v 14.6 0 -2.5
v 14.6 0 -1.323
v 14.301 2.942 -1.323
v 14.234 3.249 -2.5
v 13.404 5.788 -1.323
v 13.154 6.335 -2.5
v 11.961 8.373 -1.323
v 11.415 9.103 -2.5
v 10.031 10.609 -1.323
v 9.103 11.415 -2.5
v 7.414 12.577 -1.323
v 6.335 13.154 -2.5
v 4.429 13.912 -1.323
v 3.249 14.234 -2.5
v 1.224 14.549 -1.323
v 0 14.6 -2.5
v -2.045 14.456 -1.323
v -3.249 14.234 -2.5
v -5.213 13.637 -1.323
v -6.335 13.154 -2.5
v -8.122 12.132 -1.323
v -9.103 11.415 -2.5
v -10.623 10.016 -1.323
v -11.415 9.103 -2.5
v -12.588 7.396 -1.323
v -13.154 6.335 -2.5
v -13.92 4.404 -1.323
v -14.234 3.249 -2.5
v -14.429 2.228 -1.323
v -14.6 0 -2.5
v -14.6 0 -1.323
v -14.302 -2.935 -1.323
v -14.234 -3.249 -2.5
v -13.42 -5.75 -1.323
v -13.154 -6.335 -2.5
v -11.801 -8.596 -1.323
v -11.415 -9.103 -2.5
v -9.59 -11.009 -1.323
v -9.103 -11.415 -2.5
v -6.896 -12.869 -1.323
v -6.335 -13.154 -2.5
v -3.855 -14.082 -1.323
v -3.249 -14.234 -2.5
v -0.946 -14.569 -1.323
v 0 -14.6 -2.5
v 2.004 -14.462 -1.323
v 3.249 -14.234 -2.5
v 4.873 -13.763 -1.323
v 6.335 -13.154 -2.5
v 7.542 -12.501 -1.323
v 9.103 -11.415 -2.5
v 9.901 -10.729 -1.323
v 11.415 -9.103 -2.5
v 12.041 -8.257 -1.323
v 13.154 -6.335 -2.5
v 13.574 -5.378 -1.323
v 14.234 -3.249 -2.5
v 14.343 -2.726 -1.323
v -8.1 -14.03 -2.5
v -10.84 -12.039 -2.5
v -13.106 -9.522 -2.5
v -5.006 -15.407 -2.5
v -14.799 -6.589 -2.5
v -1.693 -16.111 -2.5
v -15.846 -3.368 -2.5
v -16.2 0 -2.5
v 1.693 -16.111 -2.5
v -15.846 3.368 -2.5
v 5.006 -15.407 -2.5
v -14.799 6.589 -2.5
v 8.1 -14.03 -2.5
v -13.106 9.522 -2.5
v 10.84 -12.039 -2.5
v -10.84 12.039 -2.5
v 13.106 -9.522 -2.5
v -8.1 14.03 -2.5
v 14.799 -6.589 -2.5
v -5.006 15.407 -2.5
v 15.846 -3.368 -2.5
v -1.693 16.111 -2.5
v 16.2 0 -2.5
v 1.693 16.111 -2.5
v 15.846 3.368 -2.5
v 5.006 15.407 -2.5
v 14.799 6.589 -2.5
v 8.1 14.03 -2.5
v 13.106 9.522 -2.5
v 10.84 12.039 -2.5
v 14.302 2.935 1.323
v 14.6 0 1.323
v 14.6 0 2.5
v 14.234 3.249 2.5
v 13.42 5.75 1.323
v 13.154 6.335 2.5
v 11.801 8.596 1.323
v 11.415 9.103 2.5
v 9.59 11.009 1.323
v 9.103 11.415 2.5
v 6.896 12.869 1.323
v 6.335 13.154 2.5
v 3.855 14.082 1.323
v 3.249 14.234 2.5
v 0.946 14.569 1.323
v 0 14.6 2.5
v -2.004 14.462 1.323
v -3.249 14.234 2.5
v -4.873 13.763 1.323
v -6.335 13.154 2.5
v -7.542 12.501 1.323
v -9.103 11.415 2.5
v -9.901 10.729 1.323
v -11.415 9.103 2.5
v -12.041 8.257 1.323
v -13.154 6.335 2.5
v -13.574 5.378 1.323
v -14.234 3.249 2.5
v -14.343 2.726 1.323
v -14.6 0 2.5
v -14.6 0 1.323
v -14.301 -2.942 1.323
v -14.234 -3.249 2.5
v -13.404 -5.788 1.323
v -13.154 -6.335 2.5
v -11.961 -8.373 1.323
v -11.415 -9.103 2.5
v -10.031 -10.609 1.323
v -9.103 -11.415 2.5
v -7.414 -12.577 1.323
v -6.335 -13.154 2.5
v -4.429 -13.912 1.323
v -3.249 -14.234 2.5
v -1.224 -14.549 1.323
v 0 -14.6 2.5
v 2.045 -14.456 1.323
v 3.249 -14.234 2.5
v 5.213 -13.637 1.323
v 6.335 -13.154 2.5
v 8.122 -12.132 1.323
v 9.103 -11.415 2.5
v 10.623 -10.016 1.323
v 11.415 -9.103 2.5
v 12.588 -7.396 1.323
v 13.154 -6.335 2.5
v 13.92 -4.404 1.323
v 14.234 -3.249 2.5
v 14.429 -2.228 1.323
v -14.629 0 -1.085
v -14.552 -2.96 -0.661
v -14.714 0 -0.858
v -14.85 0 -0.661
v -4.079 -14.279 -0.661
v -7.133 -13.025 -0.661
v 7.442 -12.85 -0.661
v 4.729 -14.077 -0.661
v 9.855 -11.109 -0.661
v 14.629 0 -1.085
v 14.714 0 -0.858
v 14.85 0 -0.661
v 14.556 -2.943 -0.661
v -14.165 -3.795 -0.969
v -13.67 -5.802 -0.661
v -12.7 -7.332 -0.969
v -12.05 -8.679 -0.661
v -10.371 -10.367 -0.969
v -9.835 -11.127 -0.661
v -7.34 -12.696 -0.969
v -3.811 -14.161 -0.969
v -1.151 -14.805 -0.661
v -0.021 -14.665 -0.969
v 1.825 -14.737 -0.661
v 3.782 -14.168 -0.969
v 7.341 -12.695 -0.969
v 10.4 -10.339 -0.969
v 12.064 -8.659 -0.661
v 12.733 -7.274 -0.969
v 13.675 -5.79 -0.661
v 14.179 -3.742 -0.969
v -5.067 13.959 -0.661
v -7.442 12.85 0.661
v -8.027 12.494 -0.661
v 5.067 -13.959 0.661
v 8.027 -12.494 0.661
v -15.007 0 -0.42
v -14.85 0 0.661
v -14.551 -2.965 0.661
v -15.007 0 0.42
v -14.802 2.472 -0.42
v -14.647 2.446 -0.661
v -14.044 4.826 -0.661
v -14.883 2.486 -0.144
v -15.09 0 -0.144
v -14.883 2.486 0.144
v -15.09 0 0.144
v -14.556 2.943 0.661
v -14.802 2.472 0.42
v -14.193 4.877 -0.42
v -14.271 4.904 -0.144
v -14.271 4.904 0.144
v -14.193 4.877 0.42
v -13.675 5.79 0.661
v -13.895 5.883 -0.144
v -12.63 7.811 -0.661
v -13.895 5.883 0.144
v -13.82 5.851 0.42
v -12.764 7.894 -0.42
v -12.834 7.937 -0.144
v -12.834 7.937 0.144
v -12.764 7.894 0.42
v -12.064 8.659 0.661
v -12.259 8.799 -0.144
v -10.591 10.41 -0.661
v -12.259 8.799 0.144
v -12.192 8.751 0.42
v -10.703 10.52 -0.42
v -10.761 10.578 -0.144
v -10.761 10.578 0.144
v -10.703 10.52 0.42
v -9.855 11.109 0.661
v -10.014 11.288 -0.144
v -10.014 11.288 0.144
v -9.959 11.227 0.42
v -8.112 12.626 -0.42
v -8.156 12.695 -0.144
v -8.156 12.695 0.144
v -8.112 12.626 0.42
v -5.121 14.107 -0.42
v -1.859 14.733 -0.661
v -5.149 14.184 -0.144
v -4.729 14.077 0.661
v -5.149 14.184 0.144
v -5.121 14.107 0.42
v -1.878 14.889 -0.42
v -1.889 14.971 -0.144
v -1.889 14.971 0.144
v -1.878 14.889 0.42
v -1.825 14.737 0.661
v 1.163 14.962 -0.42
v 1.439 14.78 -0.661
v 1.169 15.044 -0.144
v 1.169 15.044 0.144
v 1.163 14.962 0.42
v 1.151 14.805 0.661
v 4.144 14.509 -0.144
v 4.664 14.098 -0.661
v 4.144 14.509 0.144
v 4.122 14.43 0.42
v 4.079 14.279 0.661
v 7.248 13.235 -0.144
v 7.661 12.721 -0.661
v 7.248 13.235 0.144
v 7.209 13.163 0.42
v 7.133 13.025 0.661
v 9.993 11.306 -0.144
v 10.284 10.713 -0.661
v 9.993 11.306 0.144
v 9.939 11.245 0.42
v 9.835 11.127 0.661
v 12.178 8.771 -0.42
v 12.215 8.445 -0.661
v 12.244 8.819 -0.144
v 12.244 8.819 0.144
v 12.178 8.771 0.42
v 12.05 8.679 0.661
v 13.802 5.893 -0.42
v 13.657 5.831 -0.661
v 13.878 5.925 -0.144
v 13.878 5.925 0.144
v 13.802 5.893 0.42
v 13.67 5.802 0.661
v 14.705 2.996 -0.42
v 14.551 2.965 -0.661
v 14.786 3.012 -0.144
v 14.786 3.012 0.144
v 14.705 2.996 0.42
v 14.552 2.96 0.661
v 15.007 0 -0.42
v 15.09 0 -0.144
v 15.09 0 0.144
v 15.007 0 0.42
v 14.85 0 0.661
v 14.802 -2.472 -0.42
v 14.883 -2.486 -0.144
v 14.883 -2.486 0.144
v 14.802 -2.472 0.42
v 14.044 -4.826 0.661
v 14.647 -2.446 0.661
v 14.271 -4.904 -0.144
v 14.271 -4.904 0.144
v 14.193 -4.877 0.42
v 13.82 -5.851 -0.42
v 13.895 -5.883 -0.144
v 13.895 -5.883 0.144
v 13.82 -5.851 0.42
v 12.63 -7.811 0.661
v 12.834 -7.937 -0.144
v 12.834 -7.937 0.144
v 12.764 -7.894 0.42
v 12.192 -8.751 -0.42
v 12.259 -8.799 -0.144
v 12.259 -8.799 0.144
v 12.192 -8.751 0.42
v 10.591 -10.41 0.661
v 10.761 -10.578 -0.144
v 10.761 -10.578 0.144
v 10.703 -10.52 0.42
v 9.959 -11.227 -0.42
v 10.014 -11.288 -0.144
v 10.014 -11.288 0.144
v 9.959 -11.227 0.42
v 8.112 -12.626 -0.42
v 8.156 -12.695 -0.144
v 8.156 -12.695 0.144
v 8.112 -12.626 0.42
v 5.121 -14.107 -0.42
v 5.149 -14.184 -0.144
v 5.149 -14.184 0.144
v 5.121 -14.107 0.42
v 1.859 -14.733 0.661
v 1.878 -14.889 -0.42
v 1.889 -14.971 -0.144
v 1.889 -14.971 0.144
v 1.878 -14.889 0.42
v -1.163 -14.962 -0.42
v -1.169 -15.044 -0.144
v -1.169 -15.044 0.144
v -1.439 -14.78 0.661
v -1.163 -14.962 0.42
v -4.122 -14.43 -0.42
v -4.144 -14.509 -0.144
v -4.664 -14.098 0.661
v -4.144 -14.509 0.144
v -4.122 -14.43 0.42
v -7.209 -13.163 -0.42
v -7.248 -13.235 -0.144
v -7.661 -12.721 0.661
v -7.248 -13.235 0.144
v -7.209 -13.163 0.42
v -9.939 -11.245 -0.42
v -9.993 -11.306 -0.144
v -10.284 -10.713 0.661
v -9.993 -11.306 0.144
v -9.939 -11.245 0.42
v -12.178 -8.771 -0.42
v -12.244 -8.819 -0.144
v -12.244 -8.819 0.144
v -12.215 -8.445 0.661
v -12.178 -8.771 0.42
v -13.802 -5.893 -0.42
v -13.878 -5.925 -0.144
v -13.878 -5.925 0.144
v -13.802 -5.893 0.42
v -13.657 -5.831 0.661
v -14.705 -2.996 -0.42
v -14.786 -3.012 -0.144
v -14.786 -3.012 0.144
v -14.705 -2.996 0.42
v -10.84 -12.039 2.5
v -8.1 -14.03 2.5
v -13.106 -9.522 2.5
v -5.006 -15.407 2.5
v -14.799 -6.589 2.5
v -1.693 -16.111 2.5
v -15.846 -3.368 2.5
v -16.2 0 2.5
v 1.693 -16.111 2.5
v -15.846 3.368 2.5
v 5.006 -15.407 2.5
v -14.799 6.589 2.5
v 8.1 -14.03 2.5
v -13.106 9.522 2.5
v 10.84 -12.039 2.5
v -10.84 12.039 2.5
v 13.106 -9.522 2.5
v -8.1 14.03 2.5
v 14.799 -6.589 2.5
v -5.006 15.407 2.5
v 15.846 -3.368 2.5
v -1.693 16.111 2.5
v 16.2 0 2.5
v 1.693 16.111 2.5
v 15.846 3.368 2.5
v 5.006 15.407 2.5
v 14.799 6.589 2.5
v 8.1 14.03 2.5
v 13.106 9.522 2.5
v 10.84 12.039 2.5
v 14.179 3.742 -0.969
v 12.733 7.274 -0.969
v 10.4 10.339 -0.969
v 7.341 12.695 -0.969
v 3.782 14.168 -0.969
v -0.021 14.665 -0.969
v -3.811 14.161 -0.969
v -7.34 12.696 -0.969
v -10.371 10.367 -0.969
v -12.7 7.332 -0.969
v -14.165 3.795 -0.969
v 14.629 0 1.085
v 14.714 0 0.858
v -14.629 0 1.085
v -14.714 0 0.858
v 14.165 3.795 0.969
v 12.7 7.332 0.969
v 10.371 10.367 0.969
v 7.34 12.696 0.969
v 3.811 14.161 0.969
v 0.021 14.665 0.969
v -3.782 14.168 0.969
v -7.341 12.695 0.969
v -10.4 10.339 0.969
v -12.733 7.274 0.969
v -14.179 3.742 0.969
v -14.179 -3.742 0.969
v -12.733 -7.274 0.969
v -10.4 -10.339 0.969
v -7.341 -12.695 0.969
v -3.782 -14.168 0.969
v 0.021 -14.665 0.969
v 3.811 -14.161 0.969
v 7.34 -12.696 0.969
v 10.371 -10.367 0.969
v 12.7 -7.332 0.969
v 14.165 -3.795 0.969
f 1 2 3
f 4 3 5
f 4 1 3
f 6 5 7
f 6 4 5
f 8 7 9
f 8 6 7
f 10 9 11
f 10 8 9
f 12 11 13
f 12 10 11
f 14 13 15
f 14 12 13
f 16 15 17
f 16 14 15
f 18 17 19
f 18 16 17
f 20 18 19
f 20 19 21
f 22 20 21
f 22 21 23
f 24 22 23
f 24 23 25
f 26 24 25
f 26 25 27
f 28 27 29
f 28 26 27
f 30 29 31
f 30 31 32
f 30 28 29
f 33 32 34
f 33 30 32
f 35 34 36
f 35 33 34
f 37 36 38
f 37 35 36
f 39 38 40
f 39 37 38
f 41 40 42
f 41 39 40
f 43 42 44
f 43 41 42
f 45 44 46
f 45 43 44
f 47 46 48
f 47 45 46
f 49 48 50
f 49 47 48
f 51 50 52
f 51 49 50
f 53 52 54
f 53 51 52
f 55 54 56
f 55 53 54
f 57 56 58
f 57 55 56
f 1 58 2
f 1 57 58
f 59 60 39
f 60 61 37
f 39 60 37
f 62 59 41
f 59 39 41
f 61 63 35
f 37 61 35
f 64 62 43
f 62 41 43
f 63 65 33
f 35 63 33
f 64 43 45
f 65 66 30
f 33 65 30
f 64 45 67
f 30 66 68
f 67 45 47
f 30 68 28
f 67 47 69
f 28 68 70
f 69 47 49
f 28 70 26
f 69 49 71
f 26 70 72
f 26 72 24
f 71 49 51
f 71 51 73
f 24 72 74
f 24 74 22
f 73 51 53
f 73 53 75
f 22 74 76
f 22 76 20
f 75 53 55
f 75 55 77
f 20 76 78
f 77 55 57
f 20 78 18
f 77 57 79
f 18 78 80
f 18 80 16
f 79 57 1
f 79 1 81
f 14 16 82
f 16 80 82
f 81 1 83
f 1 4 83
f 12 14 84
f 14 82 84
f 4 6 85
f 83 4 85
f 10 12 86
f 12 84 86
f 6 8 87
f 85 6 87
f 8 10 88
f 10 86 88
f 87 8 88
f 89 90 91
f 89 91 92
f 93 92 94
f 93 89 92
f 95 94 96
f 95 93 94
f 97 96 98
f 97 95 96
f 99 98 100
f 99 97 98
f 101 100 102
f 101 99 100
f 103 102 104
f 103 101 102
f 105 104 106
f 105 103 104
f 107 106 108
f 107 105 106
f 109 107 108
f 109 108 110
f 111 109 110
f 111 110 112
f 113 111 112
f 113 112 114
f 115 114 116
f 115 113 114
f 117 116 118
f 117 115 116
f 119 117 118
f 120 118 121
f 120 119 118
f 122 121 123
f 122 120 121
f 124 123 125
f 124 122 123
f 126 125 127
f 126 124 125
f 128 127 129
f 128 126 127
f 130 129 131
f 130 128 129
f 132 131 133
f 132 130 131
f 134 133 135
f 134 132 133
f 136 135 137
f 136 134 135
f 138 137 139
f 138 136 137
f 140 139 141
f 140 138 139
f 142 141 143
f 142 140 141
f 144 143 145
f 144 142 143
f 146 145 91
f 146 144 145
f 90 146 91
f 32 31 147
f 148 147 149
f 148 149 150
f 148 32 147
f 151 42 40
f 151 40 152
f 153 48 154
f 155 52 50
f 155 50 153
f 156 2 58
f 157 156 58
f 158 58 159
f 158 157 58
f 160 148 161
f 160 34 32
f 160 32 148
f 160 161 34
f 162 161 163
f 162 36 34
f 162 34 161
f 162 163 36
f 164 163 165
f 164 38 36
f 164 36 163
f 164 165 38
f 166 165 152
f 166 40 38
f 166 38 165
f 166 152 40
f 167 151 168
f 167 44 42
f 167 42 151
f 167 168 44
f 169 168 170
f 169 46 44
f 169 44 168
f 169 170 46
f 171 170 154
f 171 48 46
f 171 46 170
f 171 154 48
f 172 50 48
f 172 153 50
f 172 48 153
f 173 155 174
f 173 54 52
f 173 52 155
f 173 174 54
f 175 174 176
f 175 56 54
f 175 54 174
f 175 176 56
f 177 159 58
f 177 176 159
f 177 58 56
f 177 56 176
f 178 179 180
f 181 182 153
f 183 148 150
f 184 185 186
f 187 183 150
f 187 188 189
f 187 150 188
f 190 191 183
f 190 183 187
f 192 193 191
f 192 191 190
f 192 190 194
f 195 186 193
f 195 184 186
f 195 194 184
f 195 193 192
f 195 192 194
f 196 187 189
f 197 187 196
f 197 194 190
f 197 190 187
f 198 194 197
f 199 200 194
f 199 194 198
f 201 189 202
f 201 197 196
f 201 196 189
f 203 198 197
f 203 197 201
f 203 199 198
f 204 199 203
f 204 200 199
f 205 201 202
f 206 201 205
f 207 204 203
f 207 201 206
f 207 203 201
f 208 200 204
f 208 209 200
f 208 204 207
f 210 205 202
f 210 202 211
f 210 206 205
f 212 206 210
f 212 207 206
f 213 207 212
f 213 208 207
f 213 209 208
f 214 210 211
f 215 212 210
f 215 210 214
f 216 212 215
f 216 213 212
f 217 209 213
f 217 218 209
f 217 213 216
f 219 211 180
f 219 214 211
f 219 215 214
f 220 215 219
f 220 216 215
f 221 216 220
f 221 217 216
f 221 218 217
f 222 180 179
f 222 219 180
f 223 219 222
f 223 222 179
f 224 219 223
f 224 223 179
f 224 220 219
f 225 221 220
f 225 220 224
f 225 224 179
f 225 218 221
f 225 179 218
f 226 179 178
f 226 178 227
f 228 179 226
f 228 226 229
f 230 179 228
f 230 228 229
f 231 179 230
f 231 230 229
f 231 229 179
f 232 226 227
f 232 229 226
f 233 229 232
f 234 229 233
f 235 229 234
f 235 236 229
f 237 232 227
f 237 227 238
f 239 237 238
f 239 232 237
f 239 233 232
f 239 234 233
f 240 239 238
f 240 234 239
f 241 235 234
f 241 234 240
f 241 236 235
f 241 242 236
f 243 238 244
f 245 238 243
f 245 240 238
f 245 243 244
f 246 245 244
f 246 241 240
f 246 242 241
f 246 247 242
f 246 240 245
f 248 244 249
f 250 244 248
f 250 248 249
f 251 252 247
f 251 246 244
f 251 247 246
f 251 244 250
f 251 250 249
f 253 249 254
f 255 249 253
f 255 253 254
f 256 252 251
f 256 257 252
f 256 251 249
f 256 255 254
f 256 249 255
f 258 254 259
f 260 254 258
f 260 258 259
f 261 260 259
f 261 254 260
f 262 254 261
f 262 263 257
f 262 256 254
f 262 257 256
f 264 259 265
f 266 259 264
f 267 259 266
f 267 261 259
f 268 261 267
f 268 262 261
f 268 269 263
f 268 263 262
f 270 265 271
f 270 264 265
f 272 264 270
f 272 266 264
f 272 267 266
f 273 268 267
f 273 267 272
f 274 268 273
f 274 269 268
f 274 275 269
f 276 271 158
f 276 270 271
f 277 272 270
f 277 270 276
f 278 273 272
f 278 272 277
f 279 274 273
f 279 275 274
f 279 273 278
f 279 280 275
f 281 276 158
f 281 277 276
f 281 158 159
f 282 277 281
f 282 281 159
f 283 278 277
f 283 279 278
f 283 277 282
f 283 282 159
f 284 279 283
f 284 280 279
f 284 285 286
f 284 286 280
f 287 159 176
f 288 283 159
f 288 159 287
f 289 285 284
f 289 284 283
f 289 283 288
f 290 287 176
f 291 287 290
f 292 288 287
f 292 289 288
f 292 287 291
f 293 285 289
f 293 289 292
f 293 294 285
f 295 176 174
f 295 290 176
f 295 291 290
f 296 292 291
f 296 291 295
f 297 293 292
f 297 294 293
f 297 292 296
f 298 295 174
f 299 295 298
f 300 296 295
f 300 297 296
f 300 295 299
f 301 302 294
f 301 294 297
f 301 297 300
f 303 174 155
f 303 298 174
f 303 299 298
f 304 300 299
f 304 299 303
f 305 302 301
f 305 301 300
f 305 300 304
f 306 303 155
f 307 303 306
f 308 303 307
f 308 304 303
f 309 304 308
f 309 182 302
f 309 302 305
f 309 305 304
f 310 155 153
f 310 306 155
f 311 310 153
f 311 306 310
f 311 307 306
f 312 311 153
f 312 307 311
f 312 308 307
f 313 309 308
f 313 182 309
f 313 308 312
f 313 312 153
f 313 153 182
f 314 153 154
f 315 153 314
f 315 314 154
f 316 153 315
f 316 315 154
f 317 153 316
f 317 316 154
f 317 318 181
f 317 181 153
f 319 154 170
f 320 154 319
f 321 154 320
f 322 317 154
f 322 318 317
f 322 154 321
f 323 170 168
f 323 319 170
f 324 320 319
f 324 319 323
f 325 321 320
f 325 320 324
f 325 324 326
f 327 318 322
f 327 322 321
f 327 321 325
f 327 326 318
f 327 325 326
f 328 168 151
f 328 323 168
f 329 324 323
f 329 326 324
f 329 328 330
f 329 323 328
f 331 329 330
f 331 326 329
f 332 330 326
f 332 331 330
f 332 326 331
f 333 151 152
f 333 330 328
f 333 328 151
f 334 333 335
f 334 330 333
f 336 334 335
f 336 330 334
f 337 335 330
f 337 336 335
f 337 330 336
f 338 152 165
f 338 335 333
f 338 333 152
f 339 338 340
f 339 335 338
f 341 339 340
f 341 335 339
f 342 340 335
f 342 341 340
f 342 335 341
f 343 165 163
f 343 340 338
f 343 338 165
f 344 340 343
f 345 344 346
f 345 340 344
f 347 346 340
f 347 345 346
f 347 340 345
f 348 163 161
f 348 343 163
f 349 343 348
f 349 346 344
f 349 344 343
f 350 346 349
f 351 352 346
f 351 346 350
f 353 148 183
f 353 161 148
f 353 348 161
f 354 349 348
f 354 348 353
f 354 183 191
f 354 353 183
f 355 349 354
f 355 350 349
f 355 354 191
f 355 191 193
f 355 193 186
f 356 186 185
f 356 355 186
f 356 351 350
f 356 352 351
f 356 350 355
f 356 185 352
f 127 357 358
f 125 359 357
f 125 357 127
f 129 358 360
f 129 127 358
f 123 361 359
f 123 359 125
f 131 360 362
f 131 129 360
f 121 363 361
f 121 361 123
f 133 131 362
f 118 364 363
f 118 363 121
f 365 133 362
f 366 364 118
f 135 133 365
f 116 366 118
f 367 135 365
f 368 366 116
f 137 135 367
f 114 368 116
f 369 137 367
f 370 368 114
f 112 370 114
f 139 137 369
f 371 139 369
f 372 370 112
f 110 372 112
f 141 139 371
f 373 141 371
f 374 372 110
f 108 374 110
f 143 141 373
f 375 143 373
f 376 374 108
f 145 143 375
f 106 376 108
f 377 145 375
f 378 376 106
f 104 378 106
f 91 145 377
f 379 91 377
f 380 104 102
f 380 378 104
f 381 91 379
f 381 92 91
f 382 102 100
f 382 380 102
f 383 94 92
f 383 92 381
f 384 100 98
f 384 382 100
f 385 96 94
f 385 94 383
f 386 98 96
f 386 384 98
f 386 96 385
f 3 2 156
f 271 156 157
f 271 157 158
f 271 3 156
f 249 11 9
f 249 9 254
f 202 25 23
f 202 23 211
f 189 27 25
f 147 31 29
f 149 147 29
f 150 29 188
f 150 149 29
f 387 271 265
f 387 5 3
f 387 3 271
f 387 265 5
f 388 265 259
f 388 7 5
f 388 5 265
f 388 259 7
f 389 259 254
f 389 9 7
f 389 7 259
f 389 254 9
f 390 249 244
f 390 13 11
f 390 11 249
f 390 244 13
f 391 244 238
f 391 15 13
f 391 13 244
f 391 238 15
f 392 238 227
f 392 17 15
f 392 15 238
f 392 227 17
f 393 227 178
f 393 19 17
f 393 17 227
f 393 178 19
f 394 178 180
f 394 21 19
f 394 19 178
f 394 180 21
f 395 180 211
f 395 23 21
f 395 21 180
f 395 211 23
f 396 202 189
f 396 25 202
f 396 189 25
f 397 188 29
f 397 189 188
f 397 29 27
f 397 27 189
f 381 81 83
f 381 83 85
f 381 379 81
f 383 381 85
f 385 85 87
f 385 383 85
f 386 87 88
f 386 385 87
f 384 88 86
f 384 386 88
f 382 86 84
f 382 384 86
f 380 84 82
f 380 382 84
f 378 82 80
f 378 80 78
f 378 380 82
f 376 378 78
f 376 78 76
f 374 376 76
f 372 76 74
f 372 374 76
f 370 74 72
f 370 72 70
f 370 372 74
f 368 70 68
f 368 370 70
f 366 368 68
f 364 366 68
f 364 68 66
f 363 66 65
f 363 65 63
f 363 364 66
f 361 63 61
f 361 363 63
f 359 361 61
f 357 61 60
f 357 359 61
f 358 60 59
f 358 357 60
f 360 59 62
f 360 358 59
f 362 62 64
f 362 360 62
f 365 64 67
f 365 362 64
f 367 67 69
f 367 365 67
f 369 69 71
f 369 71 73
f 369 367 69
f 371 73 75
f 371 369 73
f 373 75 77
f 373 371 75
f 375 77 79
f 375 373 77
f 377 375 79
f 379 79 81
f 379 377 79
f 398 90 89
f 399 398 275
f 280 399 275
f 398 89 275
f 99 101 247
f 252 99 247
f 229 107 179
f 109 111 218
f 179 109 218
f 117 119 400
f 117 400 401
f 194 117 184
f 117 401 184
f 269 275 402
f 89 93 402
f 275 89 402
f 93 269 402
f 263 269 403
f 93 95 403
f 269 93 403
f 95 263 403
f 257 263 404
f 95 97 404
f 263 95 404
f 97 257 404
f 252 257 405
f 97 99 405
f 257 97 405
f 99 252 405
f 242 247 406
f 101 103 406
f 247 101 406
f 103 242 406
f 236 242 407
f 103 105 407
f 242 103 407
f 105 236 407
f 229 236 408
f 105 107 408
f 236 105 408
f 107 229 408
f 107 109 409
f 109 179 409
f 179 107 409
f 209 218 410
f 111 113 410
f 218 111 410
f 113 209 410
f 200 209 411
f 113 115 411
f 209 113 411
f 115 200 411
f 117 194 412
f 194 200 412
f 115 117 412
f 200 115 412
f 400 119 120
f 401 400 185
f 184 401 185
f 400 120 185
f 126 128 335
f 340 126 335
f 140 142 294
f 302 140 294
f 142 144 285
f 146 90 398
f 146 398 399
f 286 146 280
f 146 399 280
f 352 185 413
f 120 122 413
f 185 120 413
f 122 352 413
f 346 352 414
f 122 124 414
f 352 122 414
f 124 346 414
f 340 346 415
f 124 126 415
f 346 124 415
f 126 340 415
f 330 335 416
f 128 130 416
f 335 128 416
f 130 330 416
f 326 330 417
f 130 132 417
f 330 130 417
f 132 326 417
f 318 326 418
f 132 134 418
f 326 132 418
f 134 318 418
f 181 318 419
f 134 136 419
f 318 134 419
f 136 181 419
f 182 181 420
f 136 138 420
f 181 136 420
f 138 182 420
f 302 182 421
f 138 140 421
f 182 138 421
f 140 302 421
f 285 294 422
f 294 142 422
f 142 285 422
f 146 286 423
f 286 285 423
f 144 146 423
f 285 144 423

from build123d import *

# Parameters (mm, degrees)
SKETCH_1_R      = 16.2
SKETCH_1_R_2    = 14.6
EXTRUDE_1_DEPTH = 2.5
SKETCH_3_R      = 1
FILLET_1_R      = 1


with BuildPart() as part:
    # 草图1 → 凸台-拉伸1 (new body, symmetric)
    with BuildSketch(Plane.XY):
        Circle(SKETCH_1_R)
        Circle(SKETCH_1_R_2, mode=Mode.SUBTRACT)
    extrude(amount=EXTRUDE_1_DEPTH, both=True)

    # 草图3 → 切除-旋转1 (revolve, cut)
    with BuildSketch(Plane(origin=(0, 0, 0), x_dir=(1, 0, 0), z_dir=(0, 1, 0))):
        with Locations((-14.1, 0)):
            Circle(SKETCH_3_R)
    revolve(axis=Axis((0, 0, 2.5), (0, 0, -1)), mode=Mode.SUBTRACT)

    # 圆角1
    fillet_1_edges = [part.edges().sort_by_distance(p)[0] for p in [
        (0, 14.6, 0.866025404),
        (0, -14.6, -0.866025404),
    ]]
    fillet(fillet_1_edges, radius=FILLET_1_R)


solid = part.part
